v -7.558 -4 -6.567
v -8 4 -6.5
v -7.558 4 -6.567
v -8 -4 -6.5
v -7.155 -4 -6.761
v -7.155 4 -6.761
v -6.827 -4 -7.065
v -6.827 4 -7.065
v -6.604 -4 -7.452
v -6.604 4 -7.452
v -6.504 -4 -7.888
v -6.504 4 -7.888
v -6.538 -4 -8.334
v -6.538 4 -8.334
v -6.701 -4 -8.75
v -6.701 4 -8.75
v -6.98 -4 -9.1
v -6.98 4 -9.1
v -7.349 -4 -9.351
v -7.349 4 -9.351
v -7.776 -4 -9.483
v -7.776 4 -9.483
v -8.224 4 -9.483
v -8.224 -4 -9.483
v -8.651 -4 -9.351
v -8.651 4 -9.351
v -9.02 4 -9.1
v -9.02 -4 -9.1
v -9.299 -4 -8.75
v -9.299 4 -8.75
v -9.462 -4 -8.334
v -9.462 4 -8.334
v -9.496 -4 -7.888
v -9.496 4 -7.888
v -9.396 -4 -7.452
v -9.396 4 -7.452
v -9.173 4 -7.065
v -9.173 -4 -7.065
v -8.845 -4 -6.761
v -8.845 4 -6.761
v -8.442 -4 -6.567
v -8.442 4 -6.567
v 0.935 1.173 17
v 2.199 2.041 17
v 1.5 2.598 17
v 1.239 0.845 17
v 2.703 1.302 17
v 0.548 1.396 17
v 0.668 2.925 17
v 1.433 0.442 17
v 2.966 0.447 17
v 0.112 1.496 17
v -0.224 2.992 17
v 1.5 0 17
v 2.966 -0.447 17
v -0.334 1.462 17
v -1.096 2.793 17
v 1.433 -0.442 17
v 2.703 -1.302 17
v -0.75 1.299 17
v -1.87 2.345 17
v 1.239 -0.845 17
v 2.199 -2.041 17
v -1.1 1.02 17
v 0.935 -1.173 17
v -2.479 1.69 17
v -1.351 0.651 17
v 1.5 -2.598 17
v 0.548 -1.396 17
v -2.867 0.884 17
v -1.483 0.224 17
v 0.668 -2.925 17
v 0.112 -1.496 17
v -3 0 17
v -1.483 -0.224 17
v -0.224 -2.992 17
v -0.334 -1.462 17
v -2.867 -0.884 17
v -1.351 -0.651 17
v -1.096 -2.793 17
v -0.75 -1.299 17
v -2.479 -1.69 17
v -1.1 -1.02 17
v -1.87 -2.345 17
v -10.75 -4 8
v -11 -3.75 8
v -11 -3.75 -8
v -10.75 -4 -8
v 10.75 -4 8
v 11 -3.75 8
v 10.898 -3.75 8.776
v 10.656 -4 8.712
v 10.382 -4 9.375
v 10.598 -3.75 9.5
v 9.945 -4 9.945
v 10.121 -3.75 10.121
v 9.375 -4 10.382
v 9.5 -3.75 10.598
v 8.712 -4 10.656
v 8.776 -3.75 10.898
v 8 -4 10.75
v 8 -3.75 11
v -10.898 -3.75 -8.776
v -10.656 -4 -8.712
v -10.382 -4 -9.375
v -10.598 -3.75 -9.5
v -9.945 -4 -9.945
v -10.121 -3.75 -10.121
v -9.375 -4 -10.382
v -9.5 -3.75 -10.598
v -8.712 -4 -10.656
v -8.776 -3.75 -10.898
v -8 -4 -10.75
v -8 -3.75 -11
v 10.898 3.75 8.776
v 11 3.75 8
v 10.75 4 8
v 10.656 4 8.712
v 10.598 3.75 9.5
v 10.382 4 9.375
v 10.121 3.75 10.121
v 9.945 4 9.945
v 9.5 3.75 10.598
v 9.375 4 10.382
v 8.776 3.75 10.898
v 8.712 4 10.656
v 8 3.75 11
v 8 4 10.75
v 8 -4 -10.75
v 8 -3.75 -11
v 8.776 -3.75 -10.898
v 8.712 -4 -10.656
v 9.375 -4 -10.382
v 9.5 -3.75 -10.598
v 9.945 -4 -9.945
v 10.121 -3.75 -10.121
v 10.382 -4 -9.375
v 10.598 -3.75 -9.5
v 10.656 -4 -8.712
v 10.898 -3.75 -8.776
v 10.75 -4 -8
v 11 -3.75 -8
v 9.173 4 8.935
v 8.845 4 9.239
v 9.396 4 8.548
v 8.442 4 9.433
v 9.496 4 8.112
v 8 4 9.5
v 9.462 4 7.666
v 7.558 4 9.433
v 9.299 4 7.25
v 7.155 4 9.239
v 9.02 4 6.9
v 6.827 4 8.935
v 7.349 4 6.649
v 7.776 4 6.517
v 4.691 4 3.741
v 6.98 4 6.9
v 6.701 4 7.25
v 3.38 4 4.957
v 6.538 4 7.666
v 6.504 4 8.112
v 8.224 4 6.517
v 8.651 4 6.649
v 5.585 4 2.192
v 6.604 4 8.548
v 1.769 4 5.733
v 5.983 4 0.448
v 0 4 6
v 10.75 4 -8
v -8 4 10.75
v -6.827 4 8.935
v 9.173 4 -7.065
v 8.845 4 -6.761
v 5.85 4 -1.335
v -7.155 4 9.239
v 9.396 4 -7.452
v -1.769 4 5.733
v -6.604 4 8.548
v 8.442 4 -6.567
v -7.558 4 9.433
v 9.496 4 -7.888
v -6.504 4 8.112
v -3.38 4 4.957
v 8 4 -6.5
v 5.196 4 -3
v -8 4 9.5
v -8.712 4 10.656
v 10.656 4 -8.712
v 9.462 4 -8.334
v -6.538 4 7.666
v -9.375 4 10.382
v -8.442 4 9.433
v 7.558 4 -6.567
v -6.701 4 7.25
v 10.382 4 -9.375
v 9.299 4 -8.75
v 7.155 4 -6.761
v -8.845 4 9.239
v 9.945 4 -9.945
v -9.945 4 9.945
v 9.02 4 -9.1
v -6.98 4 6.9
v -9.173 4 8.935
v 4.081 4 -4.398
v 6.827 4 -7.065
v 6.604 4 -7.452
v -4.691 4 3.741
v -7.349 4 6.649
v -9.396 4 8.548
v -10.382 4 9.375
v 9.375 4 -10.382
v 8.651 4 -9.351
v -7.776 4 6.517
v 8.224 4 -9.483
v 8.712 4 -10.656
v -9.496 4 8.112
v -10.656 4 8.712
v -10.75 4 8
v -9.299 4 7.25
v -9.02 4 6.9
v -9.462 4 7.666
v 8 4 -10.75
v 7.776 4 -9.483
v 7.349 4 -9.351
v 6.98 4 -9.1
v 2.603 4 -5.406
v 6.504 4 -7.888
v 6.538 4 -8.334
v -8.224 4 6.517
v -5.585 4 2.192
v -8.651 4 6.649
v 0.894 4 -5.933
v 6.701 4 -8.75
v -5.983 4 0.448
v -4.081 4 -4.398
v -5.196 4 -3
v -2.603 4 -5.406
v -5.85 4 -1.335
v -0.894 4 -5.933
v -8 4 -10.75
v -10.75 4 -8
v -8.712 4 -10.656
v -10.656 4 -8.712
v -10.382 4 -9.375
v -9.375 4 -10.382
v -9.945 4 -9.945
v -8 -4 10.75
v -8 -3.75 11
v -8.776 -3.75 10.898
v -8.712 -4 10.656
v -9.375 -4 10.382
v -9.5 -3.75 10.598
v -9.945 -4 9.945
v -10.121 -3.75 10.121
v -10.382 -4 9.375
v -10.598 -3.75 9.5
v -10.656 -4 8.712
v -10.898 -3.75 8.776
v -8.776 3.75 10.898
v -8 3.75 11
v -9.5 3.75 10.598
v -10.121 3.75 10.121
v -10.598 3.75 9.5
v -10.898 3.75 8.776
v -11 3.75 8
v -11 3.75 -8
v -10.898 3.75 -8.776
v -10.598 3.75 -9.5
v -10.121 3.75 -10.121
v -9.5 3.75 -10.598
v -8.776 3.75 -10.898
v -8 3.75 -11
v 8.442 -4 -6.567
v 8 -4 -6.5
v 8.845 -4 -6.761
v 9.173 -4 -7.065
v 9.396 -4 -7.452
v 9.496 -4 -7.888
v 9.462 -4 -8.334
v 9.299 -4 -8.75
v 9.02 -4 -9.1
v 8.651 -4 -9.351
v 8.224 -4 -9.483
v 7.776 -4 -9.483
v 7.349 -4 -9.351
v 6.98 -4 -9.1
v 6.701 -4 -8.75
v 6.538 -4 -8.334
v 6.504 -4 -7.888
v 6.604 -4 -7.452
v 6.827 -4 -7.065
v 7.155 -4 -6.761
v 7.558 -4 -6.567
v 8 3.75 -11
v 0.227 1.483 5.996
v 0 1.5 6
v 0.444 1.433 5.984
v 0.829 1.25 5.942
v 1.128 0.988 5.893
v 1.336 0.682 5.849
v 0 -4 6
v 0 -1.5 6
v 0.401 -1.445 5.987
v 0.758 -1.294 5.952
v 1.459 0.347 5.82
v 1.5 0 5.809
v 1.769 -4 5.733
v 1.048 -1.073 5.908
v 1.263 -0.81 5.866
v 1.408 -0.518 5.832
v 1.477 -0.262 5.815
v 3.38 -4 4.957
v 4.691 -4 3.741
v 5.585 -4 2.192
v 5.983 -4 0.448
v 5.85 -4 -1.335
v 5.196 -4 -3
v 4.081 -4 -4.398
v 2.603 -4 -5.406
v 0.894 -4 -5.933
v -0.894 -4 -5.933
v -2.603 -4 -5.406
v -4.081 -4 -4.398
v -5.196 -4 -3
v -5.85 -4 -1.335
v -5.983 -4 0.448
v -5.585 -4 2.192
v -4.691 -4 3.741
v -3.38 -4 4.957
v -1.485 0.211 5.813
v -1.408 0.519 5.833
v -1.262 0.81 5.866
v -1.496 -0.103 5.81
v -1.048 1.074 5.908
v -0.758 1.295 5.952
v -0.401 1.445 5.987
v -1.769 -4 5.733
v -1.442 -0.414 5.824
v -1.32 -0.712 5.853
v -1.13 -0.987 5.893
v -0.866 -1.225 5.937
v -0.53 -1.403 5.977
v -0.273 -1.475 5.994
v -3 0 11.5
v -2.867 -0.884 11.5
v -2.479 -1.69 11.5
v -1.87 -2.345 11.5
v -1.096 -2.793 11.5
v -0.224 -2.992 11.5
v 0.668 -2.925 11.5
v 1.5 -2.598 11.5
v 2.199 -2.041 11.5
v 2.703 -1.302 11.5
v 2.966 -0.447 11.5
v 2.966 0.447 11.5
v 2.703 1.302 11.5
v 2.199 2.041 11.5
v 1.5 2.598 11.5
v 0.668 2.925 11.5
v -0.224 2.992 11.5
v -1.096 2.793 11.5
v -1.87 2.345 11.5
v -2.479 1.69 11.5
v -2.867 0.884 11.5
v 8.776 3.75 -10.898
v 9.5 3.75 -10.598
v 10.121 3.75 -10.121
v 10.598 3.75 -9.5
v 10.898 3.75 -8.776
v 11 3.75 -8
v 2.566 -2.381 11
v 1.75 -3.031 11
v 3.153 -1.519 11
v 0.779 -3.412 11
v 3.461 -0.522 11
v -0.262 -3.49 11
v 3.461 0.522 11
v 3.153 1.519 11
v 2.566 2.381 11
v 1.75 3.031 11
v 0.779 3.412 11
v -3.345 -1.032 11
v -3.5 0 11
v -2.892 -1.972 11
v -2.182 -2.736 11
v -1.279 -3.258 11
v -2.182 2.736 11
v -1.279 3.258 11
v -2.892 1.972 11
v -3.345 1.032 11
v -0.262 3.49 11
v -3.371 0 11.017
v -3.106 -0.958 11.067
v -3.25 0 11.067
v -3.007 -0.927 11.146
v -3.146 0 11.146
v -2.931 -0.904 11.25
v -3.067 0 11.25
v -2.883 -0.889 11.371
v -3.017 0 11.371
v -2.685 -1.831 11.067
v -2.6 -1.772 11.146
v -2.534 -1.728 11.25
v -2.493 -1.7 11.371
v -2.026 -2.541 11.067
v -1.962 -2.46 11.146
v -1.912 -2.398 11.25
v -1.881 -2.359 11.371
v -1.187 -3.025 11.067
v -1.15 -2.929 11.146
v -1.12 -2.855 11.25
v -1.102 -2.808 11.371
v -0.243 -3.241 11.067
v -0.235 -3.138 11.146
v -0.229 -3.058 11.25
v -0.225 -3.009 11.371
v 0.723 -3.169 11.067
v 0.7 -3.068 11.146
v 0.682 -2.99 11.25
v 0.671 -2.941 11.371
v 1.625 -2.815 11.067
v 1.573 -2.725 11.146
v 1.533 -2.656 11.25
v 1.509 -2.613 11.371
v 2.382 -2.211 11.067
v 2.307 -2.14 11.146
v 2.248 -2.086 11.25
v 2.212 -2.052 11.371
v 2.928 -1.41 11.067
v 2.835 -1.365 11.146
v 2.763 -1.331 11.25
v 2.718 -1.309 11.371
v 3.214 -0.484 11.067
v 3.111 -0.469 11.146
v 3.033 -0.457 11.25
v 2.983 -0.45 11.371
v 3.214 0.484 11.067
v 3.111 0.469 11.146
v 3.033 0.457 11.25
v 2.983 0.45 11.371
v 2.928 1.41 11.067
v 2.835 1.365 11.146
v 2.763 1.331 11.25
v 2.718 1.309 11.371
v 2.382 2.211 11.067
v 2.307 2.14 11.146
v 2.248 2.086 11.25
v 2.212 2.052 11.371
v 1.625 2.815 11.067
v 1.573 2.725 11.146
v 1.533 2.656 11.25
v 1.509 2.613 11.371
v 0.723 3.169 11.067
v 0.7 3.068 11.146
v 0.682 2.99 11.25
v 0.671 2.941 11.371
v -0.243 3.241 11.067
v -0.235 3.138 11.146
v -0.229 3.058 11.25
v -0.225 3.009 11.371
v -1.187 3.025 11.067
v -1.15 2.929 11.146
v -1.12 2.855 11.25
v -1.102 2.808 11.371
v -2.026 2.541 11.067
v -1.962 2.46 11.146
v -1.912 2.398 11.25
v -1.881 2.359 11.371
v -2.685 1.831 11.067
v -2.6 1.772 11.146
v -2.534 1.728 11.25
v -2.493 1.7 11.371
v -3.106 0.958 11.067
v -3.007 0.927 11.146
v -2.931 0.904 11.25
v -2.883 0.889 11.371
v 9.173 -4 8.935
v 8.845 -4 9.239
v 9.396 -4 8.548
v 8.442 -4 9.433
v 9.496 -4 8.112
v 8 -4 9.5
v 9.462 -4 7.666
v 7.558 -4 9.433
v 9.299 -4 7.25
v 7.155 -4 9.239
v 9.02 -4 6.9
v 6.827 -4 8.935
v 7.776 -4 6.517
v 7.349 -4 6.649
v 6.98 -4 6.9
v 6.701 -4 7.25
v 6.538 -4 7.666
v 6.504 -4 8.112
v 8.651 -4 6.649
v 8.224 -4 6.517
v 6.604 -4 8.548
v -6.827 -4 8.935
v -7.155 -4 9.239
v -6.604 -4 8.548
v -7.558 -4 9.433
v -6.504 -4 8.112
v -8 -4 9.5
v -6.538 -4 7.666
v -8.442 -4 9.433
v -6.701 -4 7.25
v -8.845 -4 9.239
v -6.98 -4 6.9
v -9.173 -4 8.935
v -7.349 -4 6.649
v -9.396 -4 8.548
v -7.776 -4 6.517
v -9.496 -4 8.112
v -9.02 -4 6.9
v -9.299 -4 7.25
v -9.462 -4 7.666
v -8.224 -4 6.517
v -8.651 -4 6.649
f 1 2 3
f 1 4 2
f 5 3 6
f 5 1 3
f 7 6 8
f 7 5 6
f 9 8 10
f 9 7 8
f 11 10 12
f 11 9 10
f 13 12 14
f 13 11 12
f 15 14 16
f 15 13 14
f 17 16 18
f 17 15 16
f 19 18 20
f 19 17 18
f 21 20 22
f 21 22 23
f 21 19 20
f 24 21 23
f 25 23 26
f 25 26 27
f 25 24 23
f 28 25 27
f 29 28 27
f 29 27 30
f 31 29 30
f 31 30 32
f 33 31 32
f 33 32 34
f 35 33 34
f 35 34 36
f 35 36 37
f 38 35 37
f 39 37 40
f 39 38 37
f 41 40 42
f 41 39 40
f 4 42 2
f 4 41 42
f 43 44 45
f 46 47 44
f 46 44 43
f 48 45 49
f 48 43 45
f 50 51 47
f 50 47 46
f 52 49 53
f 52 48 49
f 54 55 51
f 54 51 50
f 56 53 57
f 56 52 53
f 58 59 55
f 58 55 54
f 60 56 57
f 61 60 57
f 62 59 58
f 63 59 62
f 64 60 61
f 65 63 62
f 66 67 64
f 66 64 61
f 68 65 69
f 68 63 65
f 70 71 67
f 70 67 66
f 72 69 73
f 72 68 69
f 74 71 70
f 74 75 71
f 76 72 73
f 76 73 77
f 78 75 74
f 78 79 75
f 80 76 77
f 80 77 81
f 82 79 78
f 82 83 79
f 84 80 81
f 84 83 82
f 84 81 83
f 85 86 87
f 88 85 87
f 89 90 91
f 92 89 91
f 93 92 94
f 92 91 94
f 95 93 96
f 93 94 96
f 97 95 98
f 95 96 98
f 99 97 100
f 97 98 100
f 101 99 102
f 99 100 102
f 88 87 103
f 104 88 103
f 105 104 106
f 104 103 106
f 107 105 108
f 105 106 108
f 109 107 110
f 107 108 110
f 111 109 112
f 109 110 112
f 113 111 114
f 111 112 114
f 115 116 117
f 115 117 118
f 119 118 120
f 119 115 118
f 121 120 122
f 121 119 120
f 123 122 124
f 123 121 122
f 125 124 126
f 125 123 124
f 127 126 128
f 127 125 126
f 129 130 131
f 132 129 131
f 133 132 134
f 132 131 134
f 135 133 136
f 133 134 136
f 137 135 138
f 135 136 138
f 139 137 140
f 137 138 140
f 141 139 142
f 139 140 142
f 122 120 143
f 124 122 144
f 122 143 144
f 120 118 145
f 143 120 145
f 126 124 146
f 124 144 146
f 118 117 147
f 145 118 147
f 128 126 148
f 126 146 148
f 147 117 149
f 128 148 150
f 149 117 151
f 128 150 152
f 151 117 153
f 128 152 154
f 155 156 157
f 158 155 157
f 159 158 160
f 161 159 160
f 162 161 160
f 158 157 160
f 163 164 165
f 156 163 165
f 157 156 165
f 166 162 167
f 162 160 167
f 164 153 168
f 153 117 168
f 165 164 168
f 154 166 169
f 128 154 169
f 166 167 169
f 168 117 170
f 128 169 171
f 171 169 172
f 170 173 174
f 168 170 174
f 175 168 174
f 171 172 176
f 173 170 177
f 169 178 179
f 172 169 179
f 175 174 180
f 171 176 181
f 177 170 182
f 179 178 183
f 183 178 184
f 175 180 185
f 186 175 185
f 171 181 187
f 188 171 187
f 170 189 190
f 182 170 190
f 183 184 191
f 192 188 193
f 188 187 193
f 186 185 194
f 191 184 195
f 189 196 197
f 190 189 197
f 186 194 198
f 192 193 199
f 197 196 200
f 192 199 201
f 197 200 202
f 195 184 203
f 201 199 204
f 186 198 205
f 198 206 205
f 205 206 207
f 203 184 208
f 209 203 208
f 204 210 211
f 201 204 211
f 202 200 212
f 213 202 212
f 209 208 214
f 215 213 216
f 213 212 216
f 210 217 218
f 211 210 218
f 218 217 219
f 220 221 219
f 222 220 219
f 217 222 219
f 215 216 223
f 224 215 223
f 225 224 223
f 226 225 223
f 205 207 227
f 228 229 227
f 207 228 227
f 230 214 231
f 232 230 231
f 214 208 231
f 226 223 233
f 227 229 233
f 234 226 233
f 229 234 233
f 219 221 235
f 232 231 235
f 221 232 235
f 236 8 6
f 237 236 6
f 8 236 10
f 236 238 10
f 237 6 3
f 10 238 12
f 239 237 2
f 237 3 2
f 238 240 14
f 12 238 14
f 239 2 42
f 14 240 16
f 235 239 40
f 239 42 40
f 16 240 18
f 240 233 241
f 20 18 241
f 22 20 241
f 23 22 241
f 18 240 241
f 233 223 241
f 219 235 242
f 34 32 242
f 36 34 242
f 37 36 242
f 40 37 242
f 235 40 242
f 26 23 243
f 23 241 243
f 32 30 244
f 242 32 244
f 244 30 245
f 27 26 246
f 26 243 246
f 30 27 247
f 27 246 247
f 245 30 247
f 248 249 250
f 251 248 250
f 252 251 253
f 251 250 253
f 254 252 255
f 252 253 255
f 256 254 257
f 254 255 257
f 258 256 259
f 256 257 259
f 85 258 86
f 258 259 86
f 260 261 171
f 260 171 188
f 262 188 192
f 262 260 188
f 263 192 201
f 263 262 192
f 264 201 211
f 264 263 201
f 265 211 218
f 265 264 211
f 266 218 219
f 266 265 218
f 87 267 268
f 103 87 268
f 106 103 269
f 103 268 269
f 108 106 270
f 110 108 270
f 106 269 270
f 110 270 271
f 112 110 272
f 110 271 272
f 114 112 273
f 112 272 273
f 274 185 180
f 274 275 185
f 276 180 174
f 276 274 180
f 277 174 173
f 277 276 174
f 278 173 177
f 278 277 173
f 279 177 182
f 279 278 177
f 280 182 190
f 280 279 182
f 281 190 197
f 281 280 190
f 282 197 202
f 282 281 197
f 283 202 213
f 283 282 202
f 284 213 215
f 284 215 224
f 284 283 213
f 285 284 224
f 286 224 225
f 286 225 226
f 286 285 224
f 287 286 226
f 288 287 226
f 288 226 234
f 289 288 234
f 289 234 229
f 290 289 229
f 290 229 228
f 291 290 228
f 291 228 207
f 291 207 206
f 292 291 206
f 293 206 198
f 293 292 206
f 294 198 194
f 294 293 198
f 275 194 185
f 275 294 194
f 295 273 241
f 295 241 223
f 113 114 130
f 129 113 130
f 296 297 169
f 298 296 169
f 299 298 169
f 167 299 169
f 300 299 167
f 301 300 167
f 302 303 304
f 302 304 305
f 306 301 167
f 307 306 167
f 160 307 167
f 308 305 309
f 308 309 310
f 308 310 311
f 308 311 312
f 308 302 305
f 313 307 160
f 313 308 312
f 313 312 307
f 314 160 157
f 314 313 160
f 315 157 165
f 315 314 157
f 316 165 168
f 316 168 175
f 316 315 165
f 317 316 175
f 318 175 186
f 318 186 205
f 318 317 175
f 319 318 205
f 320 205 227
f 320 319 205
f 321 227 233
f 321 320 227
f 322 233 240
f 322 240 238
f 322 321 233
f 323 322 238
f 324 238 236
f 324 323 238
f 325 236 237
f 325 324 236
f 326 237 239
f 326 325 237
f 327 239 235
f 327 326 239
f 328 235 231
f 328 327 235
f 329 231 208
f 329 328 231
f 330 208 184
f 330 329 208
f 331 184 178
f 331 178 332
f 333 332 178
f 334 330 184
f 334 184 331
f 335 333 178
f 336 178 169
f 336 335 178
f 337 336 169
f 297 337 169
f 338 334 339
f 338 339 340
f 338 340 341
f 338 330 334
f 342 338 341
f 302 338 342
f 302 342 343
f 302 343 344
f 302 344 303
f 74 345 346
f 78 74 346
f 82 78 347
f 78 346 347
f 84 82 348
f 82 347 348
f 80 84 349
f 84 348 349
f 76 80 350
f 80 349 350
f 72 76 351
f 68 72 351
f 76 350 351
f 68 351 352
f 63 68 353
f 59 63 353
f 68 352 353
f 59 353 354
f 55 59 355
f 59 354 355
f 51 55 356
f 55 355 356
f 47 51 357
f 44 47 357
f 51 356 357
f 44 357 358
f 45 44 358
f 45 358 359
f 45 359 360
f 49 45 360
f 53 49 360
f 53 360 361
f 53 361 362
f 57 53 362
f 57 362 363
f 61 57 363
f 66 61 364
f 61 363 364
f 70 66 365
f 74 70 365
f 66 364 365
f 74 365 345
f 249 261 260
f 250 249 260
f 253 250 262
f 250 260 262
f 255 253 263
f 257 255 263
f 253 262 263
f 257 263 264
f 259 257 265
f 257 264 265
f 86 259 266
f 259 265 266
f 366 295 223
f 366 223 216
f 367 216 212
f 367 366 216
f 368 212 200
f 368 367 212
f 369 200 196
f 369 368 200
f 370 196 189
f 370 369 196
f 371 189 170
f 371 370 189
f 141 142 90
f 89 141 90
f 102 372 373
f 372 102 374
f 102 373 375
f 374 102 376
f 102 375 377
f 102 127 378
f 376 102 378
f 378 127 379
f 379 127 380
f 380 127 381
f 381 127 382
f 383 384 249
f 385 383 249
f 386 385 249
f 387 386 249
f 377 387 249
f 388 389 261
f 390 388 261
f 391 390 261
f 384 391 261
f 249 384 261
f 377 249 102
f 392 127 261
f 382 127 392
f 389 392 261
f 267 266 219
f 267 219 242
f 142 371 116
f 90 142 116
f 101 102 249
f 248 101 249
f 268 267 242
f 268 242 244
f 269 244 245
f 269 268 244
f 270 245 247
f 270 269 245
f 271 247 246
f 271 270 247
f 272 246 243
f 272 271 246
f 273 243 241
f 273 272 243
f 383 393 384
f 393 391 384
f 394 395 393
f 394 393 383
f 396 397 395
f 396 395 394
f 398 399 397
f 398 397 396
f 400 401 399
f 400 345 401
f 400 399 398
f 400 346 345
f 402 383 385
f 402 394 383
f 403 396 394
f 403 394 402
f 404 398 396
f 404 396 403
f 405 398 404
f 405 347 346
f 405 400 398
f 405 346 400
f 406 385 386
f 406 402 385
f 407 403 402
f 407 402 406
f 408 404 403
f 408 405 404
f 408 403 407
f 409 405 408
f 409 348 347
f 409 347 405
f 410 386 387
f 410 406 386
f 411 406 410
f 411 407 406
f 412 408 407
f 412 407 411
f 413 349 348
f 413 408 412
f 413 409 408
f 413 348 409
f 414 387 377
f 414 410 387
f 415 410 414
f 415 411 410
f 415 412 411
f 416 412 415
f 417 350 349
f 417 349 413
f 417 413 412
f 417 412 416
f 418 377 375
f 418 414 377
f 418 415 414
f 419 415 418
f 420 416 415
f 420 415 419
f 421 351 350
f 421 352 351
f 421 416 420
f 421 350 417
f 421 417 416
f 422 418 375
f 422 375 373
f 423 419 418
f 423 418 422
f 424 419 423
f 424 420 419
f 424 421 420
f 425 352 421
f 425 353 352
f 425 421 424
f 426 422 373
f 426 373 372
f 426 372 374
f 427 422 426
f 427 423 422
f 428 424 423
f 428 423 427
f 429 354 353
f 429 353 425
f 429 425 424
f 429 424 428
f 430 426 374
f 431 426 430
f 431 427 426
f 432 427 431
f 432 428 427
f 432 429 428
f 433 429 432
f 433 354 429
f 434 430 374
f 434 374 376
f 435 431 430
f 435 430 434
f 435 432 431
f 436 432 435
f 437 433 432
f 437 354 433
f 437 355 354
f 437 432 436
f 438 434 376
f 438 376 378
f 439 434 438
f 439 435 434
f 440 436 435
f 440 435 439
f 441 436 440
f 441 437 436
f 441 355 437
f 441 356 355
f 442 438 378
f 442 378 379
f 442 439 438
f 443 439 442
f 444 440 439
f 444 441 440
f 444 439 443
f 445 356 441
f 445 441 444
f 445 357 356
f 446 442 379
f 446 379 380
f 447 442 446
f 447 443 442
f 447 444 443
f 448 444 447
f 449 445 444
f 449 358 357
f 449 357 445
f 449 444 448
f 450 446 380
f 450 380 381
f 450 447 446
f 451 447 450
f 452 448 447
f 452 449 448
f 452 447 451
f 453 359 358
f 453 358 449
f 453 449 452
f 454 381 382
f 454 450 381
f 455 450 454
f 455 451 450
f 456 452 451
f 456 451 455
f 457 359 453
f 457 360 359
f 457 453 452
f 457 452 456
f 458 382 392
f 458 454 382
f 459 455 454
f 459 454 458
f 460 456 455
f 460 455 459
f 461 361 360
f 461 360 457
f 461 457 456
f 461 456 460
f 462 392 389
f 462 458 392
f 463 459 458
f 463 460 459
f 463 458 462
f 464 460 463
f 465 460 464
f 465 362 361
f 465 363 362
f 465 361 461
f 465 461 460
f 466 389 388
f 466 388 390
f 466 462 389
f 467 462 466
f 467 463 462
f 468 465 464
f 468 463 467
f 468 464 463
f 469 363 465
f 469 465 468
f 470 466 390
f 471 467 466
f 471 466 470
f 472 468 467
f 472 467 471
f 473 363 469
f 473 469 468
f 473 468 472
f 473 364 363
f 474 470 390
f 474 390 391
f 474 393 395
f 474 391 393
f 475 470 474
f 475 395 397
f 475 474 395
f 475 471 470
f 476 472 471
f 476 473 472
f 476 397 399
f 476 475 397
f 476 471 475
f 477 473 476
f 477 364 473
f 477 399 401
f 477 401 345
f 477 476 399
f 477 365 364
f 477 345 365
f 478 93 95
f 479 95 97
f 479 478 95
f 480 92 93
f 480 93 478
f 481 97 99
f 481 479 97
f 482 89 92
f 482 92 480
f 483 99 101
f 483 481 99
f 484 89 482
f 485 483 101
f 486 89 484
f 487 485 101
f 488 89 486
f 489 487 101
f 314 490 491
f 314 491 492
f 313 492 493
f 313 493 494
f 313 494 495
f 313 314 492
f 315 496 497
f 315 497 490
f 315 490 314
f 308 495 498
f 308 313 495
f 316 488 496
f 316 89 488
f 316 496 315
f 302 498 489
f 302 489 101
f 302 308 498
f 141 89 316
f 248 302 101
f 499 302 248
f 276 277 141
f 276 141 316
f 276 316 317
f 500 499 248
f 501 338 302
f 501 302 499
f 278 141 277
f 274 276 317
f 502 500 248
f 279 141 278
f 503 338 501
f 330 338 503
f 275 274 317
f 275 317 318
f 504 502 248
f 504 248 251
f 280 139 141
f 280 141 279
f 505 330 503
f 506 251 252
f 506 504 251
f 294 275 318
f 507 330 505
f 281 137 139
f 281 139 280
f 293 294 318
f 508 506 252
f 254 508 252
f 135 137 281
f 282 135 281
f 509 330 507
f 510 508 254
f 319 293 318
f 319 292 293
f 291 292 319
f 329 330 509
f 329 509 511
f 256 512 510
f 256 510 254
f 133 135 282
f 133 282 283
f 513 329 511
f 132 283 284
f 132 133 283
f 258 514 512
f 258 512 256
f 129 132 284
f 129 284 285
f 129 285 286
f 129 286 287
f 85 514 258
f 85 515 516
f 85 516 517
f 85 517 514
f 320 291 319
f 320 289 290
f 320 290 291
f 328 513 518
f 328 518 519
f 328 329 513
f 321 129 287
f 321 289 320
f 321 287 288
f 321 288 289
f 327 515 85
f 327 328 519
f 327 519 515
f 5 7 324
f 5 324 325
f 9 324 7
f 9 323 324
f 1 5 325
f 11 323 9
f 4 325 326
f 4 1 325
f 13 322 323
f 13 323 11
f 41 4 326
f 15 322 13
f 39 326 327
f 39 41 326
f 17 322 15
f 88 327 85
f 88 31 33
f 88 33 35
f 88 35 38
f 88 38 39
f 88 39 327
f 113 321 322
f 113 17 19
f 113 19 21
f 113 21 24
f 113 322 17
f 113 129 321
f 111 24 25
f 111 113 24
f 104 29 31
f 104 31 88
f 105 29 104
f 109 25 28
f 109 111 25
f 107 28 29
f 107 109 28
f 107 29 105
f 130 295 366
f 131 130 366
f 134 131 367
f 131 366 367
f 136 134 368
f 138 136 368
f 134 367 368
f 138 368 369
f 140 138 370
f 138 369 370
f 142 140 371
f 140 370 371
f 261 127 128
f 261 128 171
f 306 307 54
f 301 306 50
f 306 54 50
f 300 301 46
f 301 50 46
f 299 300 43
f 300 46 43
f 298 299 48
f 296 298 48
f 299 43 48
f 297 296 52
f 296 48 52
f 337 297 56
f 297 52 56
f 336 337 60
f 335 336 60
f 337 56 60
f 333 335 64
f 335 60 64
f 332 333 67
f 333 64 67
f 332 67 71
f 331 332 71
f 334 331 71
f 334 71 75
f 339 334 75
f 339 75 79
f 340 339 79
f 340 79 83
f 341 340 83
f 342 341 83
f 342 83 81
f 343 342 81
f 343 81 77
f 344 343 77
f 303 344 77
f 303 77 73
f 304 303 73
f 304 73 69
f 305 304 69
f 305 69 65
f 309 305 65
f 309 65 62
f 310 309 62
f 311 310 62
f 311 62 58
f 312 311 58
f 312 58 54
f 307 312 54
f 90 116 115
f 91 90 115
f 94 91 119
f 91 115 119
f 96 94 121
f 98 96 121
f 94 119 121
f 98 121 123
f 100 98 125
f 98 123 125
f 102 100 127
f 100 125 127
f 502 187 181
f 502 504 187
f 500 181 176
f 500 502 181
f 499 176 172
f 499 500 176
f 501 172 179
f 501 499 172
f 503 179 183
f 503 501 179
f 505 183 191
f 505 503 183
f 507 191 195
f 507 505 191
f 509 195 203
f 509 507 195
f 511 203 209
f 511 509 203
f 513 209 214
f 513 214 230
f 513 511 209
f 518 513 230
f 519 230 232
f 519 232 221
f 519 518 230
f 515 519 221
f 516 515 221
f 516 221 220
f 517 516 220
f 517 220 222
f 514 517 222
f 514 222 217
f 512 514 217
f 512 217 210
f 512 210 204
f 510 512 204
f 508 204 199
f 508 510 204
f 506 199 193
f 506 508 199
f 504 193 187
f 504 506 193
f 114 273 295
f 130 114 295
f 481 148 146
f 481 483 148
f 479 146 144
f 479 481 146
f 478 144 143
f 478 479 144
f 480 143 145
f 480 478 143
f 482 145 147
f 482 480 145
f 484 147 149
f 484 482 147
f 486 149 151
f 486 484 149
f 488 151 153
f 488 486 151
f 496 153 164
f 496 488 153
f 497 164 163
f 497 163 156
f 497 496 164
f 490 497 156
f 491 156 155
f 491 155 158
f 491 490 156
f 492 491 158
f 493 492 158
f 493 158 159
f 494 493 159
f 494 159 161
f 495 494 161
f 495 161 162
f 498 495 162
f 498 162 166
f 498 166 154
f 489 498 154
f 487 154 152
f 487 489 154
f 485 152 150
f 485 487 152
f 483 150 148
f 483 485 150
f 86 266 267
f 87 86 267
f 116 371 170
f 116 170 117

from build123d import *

# Parameters (mm, degrees)
SKETCH1_R           = 1.5
SKETCH1_R_2         = 6
BOSS_EXTRUDE1_DEPTH = 4
BOSS_EXTRUDE2_START = 11
SKETCH2_R           = 3
BOSS_EXTRUDE2_DEPTH = 6
SKETCH3_R           = 1.5
CUT_EXTRUDE1_DEPTH  = 16
CHAMFER1_SIZE       = 0.25
FILLET1_R           = 0.5


with BuildPart() as part:
    # Sketch1 → Boss-Extrude1 (new, symmetric)
    with BuildSketch(Plane(origin=(0, 0, 0), x_dir=(1, 0, 0), z_dir=(0, 1, 0))):
        with BuildLine():
            Line((8, -11), (-8, -11))
            ThreePointArc((-8, -11), (-10.121320344, -10.121320344), (-11, -8))
            Line((-11, -8), (-11, 8))
            ThreePointArc((-11, 8), (-10.121320344, 10.121320344), (-8, 11))
            Line((-8, 11), (8, 11))
            ThreePointArc((8, 11), (10.121320344, 10.121320344), (11, 8))
            Line((11, 8), (11, -8))
            ThreePointArc((11, -8), (10.121320344, -10.121320344), (8, -11))
        make_face()
        with Locations(Location((-8, 8, 0), (0, 0, 270))):
            Circle(SKETCH1_R, mode=Mode.SUBTRACT)
        with Locations(Location((8, 8, 0), (0, 0, 270))):
            Circle(SKETCH1_R, mode=Mode.SUBTRACT)
        with Locations(Location((8, -8, 0), (0, 0, 270))):
            Circle(SKETCH1_R, mode=Mode.SUBTRACT)
        with Locations(Location((-8, -8, 0), (0, 0, 270))):
            Circle(SKETCH1_R, mode=Mode.SUBTRACT)
        with Locations(Location((0, 0, 0), (0, 0, 270))):
            Circle(SKETCH1_R_2, mode=Mode.SUBTRACT)
    extrude(amount=BOSS_EXTRUDE1_DEPTH, both=True)

    # Sketch2 → Boss-Extrude2 (add)
    with BuildSketch(Plane.XY.offset(BOSS_EXTRUDE2_START)):
        with Locations(Location((0, 0, 0), (0, 0, 180))):
            Circle(SKETCH2_R)
    extrude(amount=BOSS_EXTRUDE2_DEPTH)

    # Sketch3 → Cut-Extrude1 (cut)
    with BuildSketch(Plane.XY.offset(17)):
        Circle(SKETCH3_R)
    extrude(amount=-CUT_EXTRUDE1_DEPTH, mode=Mode.SUBTRACT)

    # Chamfer1
    chamfer1_edges = [part.edges().sort_by_distance(p)[0] for p in [
        (0, -4, -11),
        (10.121320344, -4, -10.121320344),
        (11, -4, 0),
        (10.121320344, -4, 10.121320344),
        (10.121320344, 4, -10.121320344),
        (0, 4, -11),
        (-10.121320344, 4, -10.121320344),
        (-11, 4, 0),
        (-10.121320344, 4, 10.121320344),
        (0, 4, 11),
        (10.121320344, 4, 10.121320344),
        (0, -4, 11),
        (11, 4, 0),
        (-10.121320344, -4, 10.121320344),
        (-11, -4, 0),
        (-10.121320344, -4, -10.121320344),
    ]]
    chamfer(chamfer1_edges, length=CHAMFER1_SIZE)

    # Fillet1
    fillet1_edges = [part.edges().sort_by_distance(p)[0] for p in [
        (3, 0, 11),
    ]]
    fillet(fillet1_edges, radius=FILLET1_R)


solid = part.part
